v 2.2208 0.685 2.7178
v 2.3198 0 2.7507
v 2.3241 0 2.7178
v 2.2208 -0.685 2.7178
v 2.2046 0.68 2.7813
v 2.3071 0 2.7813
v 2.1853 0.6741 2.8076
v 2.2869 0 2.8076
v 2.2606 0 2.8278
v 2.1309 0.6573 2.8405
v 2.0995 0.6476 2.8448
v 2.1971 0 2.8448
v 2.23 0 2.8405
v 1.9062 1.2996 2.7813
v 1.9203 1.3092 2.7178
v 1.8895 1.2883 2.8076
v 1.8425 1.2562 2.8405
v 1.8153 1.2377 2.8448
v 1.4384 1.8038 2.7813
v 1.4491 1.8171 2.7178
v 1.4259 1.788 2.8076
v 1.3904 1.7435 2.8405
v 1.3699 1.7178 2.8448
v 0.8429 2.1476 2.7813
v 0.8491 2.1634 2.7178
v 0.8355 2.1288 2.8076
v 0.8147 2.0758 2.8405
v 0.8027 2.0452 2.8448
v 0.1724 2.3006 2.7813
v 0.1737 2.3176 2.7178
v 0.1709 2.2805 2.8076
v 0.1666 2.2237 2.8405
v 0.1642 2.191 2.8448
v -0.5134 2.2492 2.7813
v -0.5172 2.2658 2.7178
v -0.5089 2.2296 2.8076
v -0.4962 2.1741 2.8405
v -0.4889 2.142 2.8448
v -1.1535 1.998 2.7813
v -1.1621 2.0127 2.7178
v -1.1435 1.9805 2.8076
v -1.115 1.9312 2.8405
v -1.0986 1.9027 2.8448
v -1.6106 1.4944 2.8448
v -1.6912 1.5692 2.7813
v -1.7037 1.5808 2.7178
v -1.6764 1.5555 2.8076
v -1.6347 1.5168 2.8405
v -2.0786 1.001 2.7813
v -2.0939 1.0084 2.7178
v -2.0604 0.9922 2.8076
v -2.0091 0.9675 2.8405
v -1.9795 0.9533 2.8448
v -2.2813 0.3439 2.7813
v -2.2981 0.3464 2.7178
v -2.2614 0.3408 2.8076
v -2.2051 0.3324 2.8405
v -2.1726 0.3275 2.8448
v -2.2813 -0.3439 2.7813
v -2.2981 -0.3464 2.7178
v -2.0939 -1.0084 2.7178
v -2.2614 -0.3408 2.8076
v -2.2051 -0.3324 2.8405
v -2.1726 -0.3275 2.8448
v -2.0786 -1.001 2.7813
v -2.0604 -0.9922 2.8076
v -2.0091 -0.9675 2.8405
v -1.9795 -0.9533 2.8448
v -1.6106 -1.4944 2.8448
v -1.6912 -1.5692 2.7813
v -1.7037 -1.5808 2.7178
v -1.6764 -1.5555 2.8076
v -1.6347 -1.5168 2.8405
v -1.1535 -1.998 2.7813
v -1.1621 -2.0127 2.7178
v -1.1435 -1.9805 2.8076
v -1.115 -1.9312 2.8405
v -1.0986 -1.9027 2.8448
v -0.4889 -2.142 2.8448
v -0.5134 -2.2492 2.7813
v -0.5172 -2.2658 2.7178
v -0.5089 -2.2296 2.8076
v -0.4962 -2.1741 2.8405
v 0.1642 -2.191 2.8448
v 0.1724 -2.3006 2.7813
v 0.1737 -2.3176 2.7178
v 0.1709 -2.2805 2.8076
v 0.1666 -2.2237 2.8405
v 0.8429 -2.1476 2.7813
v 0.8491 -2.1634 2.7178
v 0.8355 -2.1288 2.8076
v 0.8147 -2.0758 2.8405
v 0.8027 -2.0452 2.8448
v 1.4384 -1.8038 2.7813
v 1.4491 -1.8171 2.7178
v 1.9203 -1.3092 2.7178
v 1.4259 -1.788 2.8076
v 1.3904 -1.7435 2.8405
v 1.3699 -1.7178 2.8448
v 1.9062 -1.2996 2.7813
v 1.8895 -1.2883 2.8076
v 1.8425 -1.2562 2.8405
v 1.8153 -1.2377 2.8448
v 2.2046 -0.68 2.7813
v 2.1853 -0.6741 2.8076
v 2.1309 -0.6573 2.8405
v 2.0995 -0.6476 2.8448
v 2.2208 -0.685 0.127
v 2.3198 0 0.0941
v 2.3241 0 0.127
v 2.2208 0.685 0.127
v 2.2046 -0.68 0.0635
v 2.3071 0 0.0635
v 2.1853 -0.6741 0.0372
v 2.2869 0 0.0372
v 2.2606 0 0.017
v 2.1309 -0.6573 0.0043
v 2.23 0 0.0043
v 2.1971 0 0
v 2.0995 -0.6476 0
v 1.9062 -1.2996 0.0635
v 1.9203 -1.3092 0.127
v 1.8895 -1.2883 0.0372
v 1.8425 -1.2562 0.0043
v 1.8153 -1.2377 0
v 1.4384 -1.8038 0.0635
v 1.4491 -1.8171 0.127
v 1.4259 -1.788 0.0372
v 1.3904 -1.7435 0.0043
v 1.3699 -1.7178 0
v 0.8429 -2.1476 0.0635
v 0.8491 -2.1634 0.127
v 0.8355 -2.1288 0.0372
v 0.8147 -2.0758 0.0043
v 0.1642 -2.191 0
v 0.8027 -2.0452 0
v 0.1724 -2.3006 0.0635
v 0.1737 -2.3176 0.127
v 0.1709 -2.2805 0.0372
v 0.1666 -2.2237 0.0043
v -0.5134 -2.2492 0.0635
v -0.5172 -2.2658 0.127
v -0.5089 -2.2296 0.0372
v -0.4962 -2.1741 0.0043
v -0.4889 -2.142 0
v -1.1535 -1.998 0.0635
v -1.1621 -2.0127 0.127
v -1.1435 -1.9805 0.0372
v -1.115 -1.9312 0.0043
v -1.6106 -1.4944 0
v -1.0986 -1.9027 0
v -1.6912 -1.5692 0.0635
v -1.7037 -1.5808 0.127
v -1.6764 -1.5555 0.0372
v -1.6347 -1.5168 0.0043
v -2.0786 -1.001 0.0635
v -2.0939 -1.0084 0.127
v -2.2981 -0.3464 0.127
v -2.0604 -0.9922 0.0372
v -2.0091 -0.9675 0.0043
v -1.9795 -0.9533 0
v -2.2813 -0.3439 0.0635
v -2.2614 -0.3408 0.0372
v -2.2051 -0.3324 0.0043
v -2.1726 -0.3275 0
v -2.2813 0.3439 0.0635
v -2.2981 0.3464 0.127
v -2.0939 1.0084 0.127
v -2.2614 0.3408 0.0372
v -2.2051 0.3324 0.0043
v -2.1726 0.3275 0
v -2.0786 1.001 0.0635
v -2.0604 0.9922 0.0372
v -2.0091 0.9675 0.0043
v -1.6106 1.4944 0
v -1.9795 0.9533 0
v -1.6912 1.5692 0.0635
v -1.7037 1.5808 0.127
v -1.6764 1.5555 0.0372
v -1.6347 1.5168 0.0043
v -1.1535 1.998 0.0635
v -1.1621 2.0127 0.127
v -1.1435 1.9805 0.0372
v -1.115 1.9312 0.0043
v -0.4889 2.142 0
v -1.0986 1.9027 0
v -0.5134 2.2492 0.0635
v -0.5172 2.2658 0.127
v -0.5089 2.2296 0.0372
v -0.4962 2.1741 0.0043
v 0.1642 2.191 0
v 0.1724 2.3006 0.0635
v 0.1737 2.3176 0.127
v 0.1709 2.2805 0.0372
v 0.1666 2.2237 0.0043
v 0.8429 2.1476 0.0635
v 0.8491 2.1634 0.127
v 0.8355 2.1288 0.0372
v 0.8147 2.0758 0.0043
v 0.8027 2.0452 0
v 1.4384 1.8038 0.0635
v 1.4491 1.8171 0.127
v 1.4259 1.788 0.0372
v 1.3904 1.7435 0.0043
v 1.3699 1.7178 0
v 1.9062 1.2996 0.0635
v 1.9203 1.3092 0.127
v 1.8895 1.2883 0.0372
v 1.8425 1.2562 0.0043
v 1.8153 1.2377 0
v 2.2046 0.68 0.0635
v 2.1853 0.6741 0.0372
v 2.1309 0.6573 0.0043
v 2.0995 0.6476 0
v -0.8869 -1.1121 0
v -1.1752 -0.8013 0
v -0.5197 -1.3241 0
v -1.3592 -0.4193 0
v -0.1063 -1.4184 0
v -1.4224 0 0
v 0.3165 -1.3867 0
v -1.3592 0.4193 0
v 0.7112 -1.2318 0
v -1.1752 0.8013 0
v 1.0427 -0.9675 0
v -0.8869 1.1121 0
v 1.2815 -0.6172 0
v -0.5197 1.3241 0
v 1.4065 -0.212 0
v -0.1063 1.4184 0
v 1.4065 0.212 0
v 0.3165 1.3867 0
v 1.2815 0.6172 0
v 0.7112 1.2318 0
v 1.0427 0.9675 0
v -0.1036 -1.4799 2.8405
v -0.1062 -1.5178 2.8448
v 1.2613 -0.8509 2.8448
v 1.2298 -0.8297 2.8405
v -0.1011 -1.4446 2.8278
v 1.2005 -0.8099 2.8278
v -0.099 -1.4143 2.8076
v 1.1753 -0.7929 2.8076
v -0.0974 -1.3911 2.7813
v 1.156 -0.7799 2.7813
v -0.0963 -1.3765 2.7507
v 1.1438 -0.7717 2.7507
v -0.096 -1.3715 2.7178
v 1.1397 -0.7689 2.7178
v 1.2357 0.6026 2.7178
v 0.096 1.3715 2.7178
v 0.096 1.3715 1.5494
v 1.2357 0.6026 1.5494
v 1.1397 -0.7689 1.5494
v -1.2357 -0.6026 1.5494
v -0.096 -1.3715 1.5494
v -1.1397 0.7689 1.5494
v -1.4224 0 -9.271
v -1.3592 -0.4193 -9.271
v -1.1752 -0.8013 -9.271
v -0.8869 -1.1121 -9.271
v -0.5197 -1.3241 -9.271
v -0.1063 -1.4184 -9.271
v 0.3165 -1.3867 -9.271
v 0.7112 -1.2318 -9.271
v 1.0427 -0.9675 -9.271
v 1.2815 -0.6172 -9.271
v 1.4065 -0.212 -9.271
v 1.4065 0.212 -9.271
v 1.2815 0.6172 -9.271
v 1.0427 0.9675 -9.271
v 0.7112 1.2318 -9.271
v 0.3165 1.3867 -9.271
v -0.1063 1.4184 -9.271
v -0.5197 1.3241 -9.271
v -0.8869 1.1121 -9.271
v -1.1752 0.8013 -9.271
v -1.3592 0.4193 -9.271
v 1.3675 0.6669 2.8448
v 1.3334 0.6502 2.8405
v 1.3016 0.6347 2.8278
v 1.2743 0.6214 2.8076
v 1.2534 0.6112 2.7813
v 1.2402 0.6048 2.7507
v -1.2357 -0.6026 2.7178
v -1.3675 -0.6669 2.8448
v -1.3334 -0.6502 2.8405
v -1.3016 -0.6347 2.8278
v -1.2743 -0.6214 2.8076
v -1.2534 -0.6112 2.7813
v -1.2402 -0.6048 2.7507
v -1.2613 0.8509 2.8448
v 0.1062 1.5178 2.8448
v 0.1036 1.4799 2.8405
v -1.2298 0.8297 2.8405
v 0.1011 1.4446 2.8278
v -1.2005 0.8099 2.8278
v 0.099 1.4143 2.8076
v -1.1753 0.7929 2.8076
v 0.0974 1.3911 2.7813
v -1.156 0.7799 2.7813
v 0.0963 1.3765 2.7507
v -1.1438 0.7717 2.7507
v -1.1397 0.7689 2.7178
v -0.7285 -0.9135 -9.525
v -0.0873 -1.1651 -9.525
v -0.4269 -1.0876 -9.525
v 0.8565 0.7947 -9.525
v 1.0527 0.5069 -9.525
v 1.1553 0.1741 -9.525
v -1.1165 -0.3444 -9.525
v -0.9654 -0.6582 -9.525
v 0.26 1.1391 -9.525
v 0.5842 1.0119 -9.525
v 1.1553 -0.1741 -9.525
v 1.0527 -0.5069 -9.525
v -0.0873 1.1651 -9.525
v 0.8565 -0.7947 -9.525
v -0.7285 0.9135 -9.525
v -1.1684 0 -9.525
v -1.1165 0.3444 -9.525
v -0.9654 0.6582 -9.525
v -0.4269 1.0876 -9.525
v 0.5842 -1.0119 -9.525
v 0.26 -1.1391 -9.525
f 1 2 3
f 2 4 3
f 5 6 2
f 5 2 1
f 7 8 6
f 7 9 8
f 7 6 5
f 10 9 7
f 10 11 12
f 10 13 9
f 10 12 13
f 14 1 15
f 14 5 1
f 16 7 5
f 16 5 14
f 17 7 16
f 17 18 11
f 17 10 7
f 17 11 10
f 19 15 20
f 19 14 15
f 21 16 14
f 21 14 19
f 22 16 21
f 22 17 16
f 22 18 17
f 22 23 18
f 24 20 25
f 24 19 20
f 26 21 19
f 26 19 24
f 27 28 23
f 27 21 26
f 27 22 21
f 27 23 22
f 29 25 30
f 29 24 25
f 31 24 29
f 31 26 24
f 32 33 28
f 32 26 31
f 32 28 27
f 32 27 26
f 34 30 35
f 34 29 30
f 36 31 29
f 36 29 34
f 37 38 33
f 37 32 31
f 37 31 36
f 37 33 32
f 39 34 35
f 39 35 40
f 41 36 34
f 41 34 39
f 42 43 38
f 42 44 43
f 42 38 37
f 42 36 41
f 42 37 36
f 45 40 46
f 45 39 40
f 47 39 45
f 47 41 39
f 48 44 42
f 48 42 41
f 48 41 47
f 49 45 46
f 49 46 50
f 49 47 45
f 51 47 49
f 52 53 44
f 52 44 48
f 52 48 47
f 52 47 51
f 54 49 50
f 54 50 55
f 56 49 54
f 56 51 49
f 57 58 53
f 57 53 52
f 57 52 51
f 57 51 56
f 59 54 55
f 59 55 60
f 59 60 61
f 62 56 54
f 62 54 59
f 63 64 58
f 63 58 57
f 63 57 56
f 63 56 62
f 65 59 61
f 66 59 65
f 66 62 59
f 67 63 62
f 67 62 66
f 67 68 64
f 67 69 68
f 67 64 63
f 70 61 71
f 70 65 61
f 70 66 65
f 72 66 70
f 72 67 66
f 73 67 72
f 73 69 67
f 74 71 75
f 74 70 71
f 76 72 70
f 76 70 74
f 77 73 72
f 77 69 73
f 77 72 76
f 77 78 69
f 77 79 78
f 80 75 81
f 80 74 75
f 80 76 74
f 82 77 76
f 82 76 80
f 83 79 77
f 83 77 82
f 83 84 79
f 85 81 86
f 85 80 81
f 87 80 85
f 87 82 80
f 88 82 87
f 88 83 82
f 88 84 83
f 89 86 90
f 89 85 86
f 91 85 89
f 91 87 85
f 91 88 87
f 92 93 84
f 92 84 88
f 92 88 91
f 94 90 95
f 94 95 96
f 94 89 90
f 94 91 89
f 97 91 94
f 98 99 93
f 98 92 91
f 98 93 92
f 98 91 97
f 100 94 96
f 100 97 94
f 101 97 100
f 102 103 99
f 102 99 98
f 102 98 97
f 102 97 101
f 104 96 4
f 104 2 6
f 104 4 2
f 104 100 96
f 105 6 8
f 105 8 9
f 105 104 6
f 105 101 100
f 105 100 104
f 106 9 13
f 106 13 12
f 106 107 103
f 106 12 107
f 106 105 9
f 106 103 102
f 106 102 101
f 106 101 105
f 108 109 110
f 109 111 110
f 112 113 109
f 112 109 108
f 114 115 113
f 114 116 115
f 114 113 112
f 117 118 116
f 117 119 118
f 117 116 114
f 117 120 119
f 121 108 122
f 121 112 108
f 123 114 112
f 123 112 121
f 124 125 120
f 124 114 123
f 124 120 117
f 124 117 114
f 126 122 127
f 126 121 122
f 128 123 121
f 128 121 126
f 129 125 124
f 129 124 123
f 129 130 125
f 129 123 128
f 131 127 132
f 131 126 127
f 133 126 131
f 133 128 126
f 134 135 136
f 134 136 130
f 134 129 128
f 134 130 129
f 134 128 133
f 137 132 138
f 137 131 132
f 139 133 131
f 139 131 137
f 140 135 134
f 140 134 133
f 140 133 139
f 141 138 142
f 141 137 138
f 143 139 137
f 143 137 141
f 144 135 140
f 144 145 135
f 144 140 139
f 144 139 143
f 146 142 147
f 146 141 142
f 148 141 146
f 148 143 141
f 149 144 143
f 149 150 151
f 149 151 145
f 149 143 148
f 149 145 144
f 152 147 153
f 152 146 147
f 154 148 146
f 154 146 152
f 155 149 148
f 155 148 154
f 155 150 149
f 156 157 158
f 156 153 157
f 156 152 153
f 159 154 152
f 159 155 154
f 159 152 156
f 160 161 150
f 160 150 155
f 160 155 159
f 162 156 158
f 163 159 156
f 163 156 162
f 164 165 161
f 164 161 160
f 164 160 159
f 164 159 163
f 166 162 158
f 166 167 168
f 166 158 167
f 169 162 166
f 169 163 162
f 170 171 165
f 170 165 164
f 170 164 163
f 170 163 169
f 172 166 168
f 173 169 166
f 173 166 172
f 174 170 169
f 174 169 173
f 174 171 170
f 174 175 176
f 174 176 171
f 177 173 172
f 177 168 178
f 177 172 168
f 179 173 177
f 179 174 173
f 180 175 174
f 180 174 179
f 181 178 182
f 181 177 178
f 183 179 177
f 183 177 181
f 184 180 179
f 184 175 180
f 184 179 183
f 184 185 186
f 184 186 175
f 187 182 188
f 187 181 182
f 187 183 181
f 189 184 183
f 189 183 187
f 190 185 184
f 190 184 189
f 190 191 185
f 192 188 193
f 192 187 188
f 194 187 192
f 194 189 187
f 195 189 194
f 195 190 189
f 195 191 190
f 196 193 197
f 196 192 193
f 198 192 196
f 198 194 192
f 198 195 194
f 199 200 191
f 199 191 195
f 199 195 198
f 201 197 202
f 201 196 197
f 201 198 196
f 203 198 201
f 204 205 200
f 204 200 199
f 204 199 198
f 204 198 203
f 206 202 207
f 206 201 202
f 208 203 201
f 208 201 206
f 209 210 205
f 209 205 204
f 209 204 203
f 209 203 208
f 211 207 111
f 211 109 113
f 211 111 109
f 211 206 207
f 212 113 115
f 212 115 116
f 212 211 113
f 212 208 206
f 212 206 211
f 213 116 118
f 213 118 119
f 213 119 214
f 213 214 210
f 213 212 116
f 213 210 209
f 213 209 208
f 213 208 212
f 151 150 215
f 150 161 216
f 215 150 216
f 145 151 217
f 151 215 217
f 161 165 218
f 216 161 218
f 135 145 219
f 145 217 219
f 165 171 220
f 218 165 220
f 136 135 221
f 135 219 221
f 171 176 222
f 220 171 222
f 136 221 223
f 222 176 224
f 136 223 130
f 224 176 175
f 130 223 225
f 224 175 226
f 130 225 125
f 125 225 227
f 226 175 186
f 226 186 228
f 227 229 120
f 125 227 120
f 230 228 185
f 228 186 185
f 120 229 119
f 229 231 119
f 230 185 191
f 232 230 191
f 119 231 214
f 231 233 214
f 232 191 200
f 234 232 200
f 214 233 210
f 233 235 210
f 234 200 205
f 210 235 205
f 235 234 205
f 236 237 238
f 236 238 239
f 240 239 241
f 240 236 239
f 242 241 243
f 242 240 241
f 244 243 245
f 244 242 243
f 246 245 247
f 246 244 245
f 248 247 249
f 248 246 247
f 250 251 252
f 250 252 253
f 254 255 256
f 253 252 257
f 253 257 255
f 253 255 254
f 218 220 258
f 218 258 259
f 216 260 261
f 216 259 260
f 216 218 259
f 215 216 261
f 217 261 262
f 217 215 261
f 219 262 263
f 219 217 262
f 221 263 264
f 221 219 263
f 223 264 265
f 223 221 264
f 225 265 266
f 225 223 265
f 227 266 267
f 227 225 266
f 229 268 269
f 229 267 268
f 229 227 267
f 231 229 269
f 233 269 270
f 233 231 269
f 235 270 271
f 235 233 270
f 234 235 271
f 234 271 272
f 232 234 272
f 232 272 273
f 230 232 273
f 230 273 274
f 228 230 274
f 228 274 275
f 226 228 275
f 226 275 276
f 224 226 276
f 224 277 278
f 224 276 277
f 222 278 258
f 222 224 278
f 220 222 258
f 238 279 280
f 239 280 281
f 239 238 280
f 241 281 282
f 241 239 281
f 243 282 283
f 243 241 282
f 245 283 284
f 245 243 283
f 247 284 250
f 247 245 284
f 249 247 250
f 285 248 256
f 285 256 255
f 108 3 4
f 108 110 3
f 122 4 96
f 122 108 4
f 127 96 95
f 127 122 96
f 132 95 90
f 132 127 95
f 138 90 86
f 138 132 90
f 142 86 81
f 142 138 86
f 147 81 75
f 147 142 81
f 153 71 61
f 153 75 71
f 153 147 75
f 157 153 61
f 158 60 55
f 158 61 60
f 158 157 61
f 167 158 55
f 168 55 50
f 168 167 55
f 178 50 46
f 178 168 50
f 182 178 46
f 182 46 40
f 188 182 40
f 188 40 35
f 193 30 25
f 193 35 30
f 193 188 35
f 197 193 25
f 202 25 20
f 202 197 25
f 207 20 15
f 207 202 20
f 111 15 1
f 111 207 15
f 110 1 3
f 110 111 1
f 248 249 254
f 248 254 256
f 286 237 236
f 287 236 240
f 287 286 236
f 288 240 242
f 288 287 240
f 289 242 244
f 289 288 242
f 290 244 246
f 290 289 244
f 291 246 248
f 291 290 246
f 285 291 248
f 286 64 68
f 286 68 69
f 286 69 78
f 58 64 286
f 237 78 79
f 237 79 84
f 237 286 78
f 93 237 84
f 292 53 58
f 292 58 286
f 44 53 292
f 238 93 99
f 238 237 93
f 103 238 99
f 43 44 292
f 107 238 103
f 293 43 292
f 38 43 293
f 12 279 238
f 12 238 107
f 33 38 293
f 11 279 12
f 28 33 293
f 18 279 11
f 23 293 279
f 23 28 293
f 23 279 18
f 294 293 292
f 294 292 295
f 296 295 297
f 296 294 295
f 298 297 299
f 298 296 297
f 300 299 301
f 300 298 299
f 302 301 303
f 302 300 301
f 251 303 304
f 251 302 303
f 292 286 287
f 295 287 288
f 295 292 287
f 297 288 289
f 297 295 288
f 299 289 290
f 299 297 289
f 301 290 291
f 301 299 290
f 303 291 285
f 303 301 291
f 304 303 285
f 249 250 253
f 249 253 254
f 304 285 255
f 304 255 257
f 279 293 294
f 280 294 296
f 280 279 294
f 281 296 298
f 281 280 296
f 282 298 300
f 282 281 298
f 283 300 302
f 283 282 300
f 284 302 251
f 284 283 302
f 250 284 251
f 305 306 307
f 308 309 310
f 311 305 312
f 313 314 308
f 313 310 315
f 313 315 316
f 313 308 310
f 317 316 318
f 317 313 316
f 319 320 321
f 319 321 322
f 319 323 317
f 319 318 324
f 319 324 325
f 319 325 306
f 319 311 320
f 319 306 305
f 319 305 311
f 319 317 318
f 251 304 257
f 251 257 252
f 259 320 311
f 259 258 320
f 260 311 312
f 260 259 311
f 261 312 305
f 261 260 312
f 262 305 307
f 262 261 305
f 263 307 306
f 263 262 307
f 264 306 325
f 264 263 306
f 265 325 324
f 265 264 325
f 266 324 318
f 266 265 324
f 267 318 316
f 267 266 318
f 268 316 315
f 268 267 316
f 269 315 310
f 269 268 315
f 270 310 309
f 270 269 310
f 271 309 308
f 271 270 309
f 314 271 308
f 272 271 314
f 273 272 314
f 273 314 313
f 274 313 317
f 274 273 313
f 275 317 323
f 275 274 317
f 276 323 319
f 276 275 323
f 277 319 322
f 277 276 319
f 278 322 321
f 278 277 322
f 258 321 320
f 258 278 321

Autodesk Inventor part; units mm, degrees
ref_plane "YZ Plane" through (0, 0, 0) normal (1, 0, 0) x (0, 1, 0)
ref_plane "XZ Plane" through (0, 0, 0) normal (0, 1, 0) x (-1, 0, 0)
ref_plane "XY Plane" through (0, 0, 0) normal (0, 0, 1) x (1, 0, 0)
sketch "Sketch1" plane through (0, 0, 0) normal (0, 0, 1) x (1, 0, 0)
  circle A0 centre (0, 0) radius 2.3241
  dimension "max_head_dia" = 4.6482
extrude "Extrusion1" add sketch "Sketch1" along normal blind 2.8448
sketch "Sketch2" plane through (0, 0, 0) normal (0, 0, -1) x (-1, 0, 0)
  circle A0 centre (0, 0) radius 2.3241 projected
  circle A1 centre (0, 0) radius 1.4224
  dimension "max_body_dia" = 2.8448
extrude "Extrusion2" add sketch "Sketch2" along normal blind 9.525 contours A1
sketch "Sketch3" plane through (0, 0, 2.8448) normal (0, 0, 1) x (1, 0, 0)
  circle A0 centre (0, 0) radius 2.3241 projected
  line L0 (-1.1397, 0.7689) -> (0.096, 1.3715)
  line L1 (0.096, 1.3715) -> (1.2357, 0.6026)
  line L2 (1.2357, 0.6026) -> (1.1397, -0.7689)
  line L3 (1.1397, -0.7689) -> (-0.096, -1.3715)
  line L4 (-0.096, -1.3715) -> (-1.2357, -0.6026)
  line L5 (-1.2357, -0.6026) -> (-1.1397, 0.7689)
  dimension "hex_socket_size" = 2.3813
extrude "Extrusion3" cut sketch "Sketch3" against normal blind 1.2954 contours L0 L1 L2 L3 L4 L5
thread "Thread1" size "4-40 UNC" class "2A" standard "ANSI Unified Screw Threads" full length
chamfer "Chamfer1" distance 0.254 angle 45 1 edges at (1.4224, 0, -9.525)
fillet "Fillet1" radius 0.127 1 edges at (-2.3241, 0, 2.8448)
fillet "Fillet2" radius 0.127 1 edges at (-2.3241, 0, 0)
fillet "Fillet3" radius 0.127 6 edges at (-1.1877, 0.0832, 2.8448) (-0.5218, 1.0702, 2.8448) (0.6659, 0.987, 2.8448) (1.1877, -0.0832, 2.8448) (0.5218, -1.0702, 2.8448) (-0.6659, -0.987, 2.8448)
properties part number "4_40_hex_cap_screw"
